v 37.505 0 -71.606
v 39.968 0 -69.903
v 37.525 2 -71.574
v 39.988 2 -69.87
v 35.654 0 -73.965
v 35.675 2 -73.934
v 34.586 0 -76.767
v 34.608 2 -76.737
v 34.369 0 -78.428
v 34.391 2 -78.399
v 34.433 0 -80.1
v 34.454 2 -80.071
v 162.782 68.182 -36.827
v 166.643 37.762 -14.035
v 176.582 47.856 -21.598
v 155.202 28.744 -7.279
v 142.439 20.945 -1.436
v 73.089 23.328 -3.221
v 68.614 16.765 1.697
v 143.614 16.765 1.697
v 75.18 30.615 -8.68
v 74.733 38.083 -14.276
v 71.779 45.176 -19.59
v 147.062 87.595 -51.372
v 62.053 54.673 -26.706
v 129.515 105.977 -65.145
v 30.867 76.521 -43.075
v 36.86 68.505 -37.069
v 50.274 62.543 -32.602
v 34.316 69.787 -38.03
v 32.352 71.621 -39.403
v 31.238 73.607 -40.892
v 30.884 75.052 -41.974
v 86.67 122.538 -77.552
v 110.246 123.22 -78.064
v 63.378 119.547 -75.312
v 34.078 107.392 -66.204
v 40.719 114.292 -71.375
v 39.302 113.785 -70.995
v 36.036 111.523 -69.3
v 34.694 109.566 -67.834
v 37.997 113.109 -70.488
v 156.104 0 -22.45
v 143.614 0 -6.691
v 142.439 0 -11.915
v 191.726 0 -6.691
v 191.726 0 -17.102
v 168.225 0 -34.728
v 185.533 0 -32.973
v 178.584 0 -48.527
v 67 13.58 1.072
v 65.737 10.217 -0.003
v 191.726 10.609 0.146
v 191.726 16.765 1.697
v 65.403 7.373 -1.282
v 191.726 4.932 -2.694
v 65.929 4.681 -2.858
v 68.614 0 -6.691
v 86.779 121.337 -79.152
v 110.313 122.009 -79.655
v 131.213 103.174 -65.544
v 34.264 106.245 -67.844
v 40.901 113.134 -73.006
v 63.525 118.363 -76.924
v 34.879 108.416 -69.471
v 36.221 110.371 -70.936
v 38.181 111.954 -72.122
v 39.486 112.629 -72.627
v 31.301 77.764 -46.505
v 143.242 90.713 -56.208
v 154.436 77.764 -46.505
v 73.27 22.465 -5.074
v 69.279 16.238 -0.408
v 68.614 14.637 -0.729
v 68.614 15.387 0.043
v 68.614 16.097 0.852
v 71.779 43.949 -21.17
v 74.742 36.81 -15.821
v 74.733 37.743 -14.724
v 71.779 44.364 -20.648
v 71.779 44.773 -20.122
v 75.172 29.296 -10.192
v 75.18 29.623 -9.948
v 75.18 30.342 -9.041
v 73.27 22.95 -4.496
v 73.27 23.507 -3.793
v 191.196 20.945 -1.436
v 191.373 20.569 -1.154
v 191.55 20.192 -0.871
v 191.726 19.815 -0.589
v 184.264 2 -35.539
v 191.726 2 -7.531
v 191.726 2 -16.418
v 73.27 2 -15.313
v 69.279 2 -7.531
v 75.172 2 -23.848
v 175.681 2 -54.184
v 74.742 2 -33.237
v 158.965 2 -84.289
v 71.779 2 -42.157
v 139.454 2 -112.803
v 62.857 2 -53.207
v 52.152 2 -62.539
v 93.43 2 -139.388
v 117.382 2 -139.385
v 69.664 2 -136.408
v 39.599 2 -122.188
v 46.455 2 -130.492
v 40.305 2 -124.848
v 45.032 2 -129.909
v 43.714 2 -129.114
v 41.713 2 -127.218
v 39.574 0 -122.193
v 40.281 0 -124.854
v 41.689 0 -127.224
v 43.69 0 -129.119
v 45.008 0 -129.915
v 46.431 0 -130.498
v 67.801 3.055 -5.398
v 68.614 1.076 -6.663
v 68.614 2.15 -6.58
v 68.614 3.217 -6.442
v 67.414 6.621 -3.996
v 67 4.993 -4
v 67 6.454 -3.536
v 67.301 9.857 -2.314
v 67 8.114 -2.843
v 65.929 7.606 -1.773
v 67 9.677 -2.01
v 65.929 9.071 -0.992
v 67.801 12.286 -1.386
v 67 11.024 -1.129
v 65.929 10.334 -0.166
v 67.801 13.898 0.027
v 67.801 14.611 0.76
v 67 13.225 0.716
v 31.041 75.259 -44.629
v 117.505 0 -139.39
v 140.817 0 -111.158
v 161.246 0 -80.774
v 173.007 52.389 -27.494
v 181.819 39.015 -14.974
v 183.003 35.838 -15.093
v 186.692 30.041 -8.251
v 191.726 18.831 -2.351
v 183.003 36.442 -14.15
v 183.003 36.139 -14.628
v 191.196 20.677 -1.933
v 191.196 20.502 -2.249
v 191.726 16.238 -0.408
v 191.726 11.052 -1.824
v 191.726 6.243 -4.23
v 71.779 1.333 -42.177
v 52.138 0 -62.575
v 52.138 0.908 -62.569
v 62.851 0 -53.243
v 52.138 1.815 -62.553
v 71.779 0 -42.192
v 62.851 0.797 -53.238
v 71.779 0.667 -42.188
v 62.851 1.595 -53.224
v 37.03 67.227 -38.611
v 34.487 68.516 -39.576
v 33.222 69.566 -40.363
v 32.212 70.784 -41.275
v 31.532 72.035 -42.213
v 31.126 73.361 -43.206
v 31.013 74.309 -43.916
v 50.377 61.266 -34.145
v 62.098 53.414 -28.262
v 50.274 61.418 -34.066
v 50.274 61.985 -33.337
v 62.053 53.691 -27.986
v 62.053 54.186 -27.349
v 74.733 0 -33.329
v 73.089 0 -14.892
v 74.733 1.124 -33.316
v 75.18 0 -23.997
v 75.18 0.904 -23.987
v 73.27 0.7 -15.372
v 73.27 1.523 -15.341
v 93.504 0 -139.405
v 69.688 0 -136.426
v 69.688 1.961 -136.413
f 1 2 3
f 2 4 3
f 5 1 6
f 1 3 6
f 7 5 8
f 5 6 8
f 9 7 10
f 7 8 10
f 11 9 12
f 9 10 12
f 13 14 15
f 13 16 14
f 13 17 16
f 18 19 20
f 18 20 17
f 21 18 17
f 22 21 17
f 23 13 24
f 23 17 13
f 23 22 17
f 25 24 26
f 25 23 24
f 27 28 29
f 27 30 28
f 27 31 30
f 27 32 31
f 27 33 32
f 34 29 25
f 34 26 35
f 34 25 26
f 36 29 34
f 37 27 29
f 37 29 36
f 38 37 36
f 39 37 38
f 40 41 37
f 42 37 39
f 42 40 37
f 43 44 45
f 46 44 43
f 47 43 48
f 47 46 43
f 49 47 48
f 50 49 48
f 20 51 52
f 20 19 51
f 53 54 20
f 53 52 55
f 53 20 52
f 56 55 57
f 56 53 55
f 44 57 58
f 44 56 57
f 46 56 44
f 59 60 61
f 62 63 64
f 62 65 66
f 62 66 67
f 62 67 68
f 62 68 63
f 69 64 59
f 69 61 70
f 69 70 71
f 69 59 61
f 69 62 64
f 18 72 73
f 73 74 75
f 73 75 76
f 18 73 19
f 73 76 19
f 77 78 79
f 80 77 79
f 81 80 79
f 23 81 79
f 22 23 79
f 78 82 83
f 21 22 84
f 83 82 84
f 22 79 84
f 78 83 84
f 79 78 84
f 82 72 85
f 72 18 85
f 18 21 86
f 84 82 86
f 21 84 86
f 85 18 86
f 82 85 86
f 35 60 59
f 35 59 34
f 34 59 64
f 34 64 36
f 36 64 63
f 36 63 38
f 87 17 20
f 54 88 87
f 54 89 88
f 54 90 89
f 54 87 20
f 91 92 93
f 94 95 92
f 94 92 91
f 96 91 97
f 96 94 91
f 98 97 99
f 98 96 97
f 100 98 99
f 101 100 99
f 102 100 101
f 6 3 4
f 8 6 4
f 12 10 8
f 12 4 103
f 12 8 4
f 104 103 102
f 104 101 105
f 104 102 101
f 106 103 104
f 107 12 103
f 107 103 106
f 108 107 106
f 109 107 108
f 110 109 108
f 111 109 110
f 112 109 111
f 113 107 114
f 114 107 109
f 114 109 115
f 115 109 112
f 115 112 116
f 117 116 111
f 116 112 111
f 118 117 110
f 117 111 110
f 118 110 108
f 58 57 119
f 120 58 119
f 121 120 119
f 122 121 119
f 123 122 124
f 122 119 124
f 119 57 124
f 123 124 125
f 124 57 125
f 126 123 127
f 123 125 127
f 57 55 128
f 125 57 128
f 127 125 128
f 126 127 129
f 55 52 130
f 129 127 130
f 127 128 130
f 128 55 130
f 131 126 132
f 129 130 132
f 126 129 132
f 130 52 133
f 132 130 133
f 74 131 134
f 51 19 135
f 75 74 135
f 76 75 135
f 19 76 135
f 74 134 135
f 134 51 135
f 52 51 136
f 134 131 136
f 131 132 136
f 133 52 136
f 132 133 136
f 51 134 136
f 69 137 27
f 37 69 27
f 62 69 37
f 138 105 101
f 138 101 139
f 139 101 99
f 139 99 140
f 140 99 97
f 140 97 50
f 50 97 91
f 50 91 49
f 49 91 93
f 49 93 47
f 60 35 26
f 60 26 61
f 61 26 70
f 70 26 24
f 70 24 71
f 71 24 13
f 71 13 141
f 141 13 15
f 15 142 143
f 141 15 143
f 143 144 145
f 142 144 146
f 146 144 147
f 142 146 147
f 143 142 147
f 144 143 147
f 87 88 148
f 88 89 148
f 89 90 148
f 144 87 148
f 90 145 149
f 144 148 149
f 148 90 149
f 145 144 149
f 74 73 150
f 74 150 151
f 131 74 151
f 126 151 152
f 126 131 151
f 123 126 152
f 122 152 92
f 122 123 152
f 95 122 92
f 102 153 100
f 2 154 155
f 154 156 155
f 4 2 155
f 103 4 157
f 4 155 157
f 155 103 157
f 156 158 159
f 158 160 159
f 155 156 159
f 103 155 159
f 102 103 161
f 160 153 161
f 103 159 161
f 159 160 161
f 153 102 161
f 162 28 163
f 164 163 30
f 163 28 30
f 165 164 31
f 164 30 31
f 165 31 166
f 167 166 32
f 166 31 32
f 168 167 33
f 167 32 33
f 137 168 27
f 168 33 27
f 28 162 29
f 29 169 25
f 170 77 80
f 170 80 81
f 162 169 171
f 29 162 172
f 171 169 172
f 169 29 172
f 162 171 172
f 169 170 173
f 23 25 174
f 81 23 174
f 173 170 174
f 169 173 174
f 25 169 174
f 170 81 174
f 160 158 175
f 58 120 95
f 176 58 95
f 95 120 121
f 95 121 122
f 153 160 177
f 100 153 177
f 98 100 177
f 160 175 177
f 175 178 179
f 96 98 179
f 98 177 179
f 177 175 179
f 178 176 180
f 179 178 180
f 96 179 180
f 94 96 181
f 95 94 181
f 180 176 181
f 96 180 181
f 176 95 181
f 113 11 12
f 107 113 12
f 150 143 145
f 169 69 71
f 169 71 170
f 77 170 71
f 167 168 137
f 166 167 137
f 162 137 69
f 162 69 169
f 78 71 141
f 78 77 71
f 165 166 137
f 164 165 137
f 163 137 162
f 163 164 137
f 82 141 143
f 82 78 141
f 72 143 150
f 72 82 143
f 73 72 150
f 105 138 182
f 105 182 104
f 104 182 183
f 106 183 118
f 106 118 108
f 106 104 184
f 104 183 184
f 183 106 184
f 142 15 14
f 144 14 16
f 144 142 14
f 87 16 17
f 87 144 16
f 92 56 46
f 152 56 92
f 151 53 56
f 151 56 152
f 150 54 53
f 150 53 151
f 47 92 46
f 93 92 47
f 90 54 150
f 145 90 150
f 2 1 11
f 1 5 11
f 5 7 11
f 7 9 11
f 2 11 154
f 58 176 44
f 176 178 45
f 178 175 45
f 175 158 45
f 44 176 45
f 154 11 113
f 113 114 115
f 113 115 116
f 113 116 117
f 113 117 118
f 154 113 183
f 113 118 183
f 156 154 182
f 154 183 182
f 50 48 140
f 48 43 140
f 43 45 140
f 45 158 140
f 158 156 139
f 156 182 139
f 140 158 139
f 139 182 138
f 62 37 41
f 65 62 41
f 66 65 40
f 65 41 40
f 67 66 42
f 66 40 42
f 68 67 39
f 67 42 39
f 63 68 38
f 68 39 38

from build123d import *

# Parameters (mm, degrees)
BOSS_EXTRUDE5_REACH            = 265.679
BOSS_EXTRUDE6_REACH            = 265.679
BOSS_EXTRUDE6_END_MAJOR_RADIUS = 41.29497886
BOSS_EXTRUDE6_END_MINOR_RADIUS = 34.238910582
CUT_EXTRUDE2_DEPTH             = 264.679090264
CUT_EXTRUDE2_DEPTH_BACK        = 264.679090264
SKETCH15_W                     = 51.852711212
SKETCH15_H                     = 208.671256167
CUT_EXTRUDE3_DEPTH             = 268.405797009
CUT_EXTRUDE3_TAPER             = -7
FILLET1_R                      = 10


with BuildPart() as part:
    # Sweep1: sweep along a path in Sketch9
    with BuildLine(Plane(origin=(0, 0, 0), x_dir=(0, 0, -1), z_dir=(1, 0, 0))) as sweep1_path:
        ThreePointArc((6.690833444, 0), (4.4769871, 9.372874687), (-1.696623298, 16.764655947))
    # Sketch3 → Sweep1 (sweep)
    with BuildSketch(Plane(origin=(0, 0, 0), x_dir=(1, 0, 0), z_dir=(0, 1, 0))):
        with BuildLine():
            Line((142.439103739, 11.914830112), (143.614236161, 6.690833444))
            Line((143.614236161, 6.690833444), (83.614236161, 6.690833444))
            Line((83.614236161, 6.690833444), (68.614236161, 6.690833444))
            ThreePointArc((68.614236161, 6.690833444), (75.180479735, 23.997298156), (71.779240838, 42.192375773))
            ThreePointArc((71.779240838, 42.192375773), (51.379079295, 63.12072091), (24.905577059, 75.502800726))
            ThreePointArc((24.905577059, 75.502800726), (11.315687886, 83.748123559), (5.247844857, 98.440016471))
            ThreePointArc((5.247844857, 98.440016471), (7.693142423, 109.618807389), (15.866887418, 117.62722417))
            ThreePointArc((15.866887418, 117.62722417), (96.637810578, 139.573762678), (179.070811064, 125.068832083))
            ThreePointArc((179.070811064, 125.068832083), (185.95529686, 120.311391566), (190.290589438, 113.153555076))
            Line((190.290589438, 113.153555076), (190.62158299, 112.199107439))
            ThreePointArc((190.62158299, 112.199107439), (191.44765289, 108.968802746), (191.725584387, 105.646151098))
            Line((191.725584387, 105.646151098), (191.725584387, 88.676044486))
            ThreePointArc((191.725584387, 88.676044486), (190.474138078, 74.473395816), (185.740302271, 61.024524277))
            ThreePointArc((185.740302271, 61.024524277), (167.286232208, 33.651220513), (142.439103739, 11.914830112))
        make_face()
    sweep(path=sweep1_path.line)

    # Boss-Extrude5: up to this cone (the profile starts outside it)
    boss_extrude5_end = Plane(origin=(191.725584, 0, 14.257299609), z_dir=(-1, 0, 0)).offset(43.399088878) * Cone(4.445e-06, 990.357764429, 222.779911122, align=(Align.CENTER, Align.CENTER, Align.MIN), mode=Mode.PRIVATE)
    # Sketch11 → Boss-Extrude5 (add, up to the surface)
    with BuildSketch(Plane(origin=(191.725584387, 0, 0), x_dir=(0, 0, -1), z_dir=(1, 0, 0)), mode=Mode.PRIVATE) as boss_extrude5_sk1:
        with BuildLine():
            Line((47.462397011, 82.376892243), (30.882313527, 60.247558735))
            Line((30.882313527, 60.247558735), (1.435728928, 20.945386831))
            ThreePointArc((1.435728928, 20.945386831), (9.148899919, 11.710260363), (11.914830112, 0))
            Line((11.914830112, 0), (61.024524277, 0))
            Line((61.024524277, 0), (88.676044486, 0))
            ThreePointArc((88.676044486, 0), (77.797814579, 46.055719281), (47.462397011, 82.376892243))
        make_face()
    boss_extrude5_tool1 = extrude(boss_extrude5_sk1.sketch, amount=-BOSS_EXTRUDE5_REACH, mode=Mode.PRIVATE) - boss_extrude5_end
    add(boss_extrude5_tool1.solids().sort_by_distance((191.725584, 31.140819, -47.986254))[0])

    # Boss-Extrude6: up to this torus (the profile starts outside it)
    boss_extrude6_end = Plane(origin=(41.076827722, 0, 14.257299609), z_dir=(1, 0, 0)) * Torus(BOSS_EXTRUDE6_END_MAJOR_RADIUS, BOSS_EXTRUDE6_END_MINOR_RADIUS, mode=Mode.PRIVATE)
    # Sketch12 → Boss-Extrude6 (add, up to the surface)
    with BuildSketch(Plane(origin=(191.725584387, 0, 0), x_dir=(0, 0, -1), z_dir=(1, 0, 0)), mode=Mode.PRIVATE) as boss_extrude6_sk1:
        with BuildLine():
            Line((1.435728928, 20.945386831), (-1.696623298, 16.764655947))
            ThreePointArc((-1.696623298, 16.764655947), (1.119891209, 7.693299714), (6.690833444, 0))
            Line((6.690833444, 0), (11.914830112, 0))
            ThreePointArc((11.914830112, 0), (9.148899919, 11.710260363), (1.435728928, 20.945386831))
        make_face()
    boss_extrude6_tool1 = extrude(boss_extrude6_sk1.sketch, amount=-BOSS_EXTRUDE6_REACH, mode=Mode.PRIVATE) - boss_extrude6_end
    add(boss_extrude6_tool1.solids().sort_by_distance((191.725584, 9.709782, -5.15039))[0])

    # Sketch14 → Cut-Extrude2 (cut, two sides: drawn at the far end of the back side and taken through both)
    with BuildSketch(Plane(origin=(191.725584387, 0, 0), x_dir=(0, 0, -1), z_dir=(1, 0, 0)).offset(-CUT_EXTRUDE2_DEPTH_BACK)):
        with BuildLine():
            Line((105.646151098, 2), (149.683498086, 2))
            Line((149.683498086, 2), (149.683498086, 144.664441597))
            Line((149.683498086, 144.664441597), (96.629526617, 144.664441597))
            Line((96.629526617, 144.664441597), (46.505246197, 77.763878679))
            Line((46.505246197, 77.763878679), (0.408030952, 16.238214412))
            ThreePointArc((0.408030952, 16.238214412), (2.90852666, 8.588164632), (7.531494019, 2))
            Line((7.531494019, 2), (84.410363787, 2))
            Line((84.410363787, 2), (88.676044486, 2))
            Line((88.676044486, 2), (105.646151098, 2))
        make_face()
    extrude(amount=CUT_EXTRUDE2_DEPTH + CUT_EXTRUDE2_DEPTH_BACK, mode=Mode.SUBTRACT)

    # Sketch15 → Cut-Extrude3 (cut, through all)
    with BuildSketch(Plane(origin=(0, 0, 0), x_dir=(1, 0, 0), z_dir=(0, -0.10182146993355343, 0.9948026881048173))):
        with Locations((-1.277666278, 17.910609482)):
            Rectangle(SKETCH15_W, SKETCH15_H)
    extrude(amount=-CUT_EXTRUDE3_DEPTH, taper=CUT_EXTRUDE3_TAPER, mode=Mode.SUBTRACT)

    # Fillet1
    fillet1_edges = [part.edges().sort_by_distance(p)[0] for p in [
        (40.347072898, 1.000004161, -128.41868422),
        (34.696815444, 111.874269162, -70.812250863),
        (30.333338635, 69.924766029, -39.382594446),
        (33.541632629, 1.000078518, -72.703242973),
    ]]
    fillet(fillet1_edges, radius=FILLET1_R)

    # Cut-Sweep1: sweep along a path in Sketch17
    with BuildLine(Plane(origin=(0, 0, 0), x_dir=(0, 0, -1), z_dir=(1, 0, 0))) as cut_sweep1_path:
        ThreePointArc((62.370921608, 102.275206583), (105.746248809, 53.324211599), (121.268282878, -10.210703039))
    # Sketch16 → Cut-Sweep1 (sweep, cut)
    with BuildSketch(Plane(origin=(0, 6.841546732, 9.131369543), x_dir=(1, 0, 0), z_dir=(0, 0.599608388931302, 0.8002935585916011))):
        with BuildLine():
            Line((95.683594782, 159.687794473), (195.090767436, 159.687794473))
            Line((195.090767436, 159.687794473), (195.090767436, 6.80339077))
            ThreePointArc((195.090767436, 6.80339077), (154.850931705, 89.399030557), (95.683594782, 159.687794473))
        make_face()
    sweep(path=cut_sweep1_path.line, mode=Mode.SUBTRACT)


solid = part.part
